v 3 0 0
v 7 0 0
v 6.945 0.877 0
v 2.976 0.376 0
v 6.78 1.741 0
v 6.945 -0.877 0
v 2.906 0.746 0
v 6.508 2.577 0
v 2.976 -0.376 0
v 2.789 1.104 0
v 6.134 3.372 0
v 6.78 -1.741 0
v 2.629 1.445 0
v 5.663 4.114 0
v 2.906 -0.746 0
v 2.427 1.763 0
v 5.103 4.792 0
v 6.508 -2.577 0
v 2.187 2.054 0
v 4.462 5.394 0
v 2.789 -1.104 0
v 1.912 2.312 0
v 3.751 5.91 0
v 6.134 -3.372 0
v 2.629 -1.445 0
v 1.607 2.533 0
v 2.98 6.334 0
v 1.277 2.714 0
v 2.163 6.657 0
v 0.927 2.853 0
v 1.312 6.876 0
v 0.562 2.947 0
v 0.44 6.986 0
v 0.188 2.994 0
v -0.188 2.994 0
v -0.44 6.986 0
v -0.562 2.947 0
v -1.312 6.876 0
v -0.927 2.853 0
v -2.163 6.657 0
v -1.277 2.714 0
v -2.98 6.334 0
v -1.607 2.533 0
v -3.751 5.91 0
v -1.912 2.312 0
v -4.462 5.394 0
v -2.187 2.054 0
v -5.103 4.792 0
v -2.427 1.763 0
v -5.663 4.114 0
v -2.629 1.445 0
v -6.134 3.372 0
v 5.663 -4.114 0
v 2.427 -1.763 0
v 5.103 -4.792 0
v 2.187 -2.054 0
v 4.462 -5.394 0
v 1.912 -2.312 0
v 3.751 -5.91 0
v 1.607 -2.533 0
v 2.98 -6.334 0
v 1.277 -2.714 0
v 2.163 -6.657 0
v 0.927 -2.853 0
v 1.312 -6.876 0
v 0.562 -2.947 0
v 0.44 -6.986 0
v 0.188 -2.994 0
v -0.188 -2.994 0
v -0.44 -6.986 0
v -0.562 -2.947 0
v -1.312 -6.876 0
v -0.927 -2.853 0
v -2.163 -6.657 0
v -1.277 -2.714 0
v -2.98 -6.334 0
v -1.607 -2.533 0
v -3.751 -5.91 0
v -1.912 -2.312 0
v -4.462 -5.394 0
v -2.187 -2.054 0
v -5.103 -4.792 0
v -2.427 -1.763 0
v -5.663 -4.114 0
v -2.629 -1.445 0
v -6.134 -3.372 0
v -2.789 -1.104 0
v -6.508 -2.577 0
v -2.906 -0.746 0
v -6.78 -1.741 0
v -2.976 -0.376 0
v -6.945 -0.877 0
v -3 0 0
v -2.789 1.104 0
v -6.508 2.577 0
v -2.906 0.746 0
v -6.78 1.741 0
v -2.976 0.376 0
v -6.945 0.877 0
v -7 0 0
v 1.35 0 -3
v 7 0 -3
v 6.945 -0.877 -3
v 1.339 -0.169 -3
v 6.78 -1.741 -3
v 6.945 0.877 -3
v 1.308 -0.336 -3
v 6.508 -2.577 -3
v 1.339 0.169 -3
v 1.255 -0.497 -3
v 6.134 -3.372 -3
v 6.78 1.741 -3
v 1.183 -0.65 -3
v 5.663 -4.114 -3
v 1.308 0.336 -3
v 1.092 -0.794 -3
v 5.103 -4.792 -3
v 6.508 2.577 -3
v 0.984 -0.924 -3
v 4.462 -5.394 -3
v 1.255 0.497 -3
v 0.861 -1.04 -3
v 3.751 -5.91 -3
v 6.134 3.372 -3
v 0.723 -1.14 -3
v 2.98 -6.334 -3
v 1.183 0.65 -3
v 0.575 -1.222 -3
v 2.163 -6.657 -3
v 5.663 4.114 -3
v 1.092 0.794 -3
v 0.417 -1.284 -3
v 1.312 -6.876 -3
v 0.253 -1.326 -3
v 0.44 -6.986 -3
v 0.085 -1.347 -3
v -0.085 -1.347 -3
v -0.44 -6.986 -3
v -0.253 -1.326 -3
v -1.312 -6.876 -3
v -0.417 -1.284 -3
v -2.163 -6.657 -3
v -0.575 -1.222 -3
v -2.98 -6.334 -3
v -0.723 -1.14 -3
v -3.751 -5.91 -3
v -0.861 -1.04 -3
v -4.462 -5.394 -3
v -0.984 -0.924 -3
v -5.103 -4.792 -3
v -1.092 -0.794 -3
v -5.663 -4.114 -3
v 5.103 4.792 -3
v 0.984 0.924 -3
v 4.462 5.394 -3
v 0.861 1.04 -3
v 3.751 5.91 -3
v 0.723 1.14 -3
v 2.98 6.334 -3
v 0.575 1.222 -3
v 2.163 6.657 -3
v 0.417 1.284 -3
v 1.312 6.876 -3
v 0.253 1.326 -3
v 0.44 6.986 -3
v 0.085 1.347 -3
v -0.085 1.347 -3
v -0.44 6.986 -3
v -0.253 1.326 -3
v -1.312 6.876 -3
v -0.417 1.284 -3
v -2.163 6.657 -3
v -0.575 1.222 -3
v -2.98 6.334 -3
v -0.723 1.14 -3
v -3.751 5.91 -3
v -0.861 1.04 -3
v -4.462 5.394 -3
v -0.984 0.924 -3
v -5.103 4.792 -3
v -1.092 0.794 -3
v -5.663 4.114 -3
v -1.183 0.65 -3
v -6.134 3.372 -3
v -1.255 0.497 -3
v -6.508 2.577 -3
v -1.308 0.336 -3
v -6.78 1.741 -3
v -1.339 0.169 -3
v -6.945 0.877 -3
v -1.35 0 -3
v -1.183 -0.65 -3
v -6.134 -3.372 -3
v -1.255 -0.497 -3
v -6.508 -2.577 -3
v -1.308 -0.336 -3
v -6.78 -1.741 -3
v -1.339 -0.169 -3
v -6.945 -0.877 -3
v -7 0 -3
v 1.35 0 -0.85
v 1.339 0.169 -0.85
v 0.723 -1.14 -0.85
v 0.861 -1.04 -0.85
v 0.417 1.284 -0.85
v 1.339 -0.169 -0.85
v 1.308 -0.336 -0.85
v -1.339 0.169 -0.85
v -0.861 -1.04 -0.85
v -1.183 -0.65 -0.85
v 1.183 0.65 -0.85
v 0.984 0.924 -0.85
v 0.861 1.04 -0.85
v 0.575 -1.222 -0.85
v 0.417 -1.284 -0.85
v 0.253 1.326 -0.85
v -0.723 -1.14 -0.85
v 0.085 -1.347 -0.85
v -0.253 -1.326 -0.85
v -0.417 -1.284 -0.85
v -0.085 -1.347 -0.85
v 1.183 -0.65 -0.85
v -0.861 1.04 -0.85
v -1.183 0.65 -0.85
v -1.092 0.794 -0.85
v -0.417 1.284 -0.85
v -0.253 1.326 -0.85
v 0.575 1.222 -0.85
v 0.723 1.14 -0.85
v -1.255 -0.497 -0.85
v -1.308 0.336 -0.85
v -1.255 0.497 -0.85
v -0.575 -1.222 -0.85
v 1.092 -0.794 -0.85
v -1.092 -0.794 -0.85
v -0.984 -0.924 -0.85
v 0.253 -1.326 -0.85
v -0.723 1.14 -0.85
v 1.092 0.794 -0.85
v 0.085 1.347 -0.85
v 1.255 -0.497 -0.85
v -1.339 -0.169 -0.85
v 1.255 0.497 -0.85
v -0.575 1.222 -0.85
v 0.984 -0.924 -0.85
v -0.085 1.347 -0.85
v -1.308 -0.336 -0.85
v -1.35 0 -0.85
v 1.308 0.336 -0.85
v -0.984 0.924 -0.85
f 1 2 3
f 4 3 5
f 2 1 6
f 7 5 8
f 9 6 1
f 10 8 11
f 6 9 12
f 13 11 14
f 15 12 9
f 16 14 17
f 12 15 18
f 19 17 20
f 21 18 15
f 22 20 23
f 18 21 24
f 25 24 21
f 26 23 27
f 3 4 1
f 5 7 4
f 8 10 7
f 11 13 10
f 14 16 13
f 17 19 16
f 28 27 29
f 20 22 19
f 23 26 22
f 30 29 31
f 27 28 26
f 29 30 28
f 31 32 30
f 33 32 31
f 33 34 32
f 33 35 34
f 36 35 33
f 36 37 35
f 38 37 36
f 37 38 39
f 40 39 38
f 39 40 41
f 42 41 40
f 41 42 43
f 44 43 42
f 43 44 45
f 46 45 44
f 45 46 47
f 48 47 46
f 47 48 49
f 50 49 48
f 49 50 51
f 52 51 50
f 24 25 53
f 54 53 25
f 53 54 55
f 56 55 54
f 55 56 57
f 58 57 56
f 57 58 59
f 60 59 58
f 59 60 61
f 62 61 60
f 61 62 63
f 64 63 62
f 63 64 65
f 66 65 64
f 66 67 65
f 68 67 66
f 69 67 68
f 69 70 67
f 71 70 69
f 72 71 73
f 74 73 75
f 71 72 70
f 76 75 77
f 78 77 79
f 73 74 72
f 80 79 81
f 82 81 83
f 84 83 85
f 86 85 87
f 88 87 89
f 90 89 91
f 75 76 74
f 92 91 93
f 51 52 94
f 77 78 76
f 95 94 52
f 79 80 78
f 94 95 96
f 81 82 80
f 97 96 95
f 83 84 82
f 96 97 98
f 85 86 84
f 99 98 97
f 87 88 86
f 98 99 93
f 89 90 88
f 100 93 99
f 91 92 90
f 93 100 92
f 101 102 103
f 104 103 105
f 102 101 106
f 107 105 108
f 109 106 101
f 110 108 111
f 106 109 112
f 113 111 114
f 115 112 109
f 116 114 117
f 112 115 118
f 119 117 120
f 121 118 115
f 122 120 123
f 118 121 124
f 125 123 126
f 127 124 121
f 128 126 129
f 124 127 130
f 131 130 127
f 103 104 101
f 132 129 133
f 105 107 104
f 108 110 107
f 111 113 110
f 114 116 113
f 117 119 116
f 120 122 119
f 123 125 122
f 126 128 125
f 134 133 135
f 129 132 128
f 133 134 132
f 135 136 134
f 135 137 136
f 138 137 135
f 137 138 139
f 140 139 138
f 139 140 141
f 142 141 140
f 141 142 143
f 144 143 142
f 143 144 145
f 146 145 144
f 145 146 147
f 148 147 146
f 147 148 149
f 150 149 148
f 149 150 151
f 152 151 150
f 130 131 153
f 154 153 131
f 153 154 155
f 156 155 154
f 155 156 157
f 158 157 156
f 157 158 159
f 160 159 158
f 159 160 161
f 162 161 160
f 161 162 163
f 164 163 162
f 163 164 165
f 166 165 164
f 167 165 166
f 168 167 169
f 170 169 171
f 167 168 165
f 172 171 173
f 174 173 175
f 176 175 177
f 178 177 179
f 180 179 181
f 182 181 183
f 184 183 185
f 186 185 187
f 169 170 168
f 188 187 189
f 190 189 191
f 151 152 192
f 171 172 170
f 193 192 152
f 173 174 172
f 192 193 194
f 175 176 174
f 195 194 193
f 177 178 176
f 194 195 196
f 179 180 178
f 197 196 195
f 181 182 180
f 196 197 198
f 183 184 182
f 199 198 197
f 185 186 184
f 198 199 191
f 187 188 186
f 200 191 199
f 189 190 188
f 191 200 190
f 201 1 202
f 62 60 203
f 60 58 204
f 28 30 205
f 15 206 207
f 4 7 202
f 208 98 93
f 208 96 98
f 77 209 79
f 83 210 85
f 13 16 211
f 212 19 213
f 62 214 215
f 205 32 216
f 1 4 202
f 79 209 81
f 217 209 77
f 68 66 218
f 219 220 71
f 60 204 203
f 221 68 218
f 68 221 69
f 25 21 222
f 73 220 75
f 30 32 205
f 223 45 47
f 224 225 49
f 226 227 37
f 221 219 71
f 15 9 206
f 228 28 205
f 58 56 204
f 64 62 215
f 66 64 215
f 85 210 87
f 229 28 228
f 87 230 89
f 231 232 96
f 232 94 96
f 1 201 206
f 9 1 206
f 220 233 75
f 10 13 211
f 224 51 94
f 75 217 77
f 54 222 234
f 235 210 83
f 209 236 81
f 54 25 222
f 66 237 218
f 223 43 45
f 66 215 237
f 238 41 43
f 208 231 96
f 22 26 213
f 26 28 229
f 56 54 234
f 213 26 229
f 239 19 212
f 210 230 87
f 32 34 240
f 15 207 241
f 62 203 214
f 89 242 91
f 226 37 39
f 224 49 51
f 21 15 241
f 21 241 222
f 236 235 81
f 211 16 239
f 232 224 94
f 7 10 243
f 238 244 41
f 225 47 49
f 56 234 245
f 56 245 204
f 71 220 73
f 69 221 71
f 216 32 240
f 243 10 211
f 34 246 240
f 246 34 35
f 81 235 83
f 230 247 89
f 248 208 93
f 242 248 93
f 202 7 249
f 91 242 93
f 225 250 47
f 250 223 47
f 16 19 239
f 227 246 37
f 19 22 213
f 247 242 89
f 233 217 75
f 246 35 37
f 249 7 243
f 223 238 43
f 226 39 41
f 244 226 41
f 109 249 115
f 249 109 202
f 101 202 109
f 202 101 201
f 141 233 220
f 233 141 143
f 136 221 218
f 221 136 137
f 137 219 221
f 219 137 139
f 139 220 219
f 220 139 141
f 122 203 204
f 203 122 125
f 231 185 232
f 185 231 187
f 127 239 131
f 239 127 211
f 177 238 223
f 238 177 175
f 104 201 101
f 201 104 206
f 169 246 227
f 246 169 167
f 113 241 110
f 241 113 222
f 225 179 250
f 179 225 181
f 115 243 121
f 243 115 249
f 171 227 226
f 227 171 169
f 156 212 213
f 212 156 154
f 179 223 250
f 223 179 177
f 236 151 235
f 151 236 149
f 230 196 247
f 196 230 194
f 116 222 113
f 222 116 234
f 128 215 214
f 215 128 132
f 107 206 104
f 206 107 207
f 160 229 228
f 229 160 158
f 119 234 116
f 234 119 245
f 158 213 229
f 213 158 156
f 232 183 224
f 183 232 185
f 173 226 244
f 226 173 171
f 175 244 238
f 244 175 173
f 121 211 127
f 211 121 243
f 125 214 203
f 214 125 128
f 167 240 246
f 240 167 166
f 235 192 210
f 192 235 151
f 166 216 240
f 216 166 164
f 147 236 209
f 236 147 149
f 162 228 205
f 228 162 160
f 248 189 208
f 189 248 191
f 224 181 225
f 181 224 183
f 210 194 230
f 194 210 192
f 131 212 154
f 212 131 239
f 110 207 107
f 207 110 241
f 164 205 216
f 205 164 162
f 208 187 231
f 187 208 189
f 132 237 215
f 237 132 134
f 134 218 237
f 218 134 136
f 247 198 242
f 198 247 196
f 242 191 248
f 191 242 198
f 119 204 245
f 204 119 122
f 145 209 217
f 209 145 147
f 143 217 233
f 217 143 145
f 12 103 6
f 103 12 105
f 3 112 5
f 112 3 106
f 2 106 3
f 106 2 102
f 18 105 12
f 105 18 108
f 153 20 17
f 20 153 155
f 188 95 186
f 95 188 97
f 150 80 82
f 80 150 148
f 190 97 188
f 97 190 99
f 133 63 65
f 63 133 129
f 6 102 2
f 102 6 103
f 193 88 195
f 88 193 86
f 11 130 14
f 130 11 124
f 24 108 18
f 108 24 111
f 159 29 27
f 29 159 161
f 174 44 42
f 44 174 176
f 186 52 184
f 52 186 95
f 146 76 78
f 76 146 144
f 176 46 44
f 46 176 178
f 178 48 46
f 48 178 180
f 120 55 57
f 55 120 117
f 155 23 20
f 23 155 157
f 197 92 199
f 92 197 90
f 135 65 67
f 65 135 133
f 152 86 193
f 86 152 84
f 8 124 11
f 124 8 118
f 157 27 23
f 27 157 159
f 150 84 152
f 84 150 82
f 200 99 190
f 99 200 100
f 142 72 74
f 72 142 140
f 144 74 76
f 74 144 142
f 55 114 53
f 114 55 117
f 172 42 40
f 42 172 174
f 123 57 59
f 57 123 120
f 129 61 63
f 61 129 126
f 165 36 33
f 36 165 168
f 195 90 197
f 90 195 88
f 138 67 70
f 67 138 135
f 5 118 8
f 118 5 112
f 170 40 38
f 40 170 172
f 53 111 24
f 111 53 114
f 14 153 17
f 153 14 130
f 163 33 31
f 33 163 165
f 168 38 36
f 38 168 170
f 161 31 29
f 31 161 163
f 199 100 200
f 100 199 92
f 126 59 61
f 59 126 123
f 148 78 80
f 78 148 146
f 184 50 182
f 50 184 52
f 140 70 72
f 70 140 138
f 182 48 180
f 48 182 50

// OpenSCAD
$fn = 50;


difference() {
	union() {
		translate(v = [0, 0, -3.0000000000]) {
			cylinder(h = 3, r = 7.0000000000);
		}
	}
	union() {
		translate(v = [0, 0, 0]) {
			rotate(a = [0, 0, 0]) {
				difference() {
					union() {
						translate(v = [0, 0, -3.0000000000]) {
							cylinder(h = 3, r = 1.0000000000);
						}
						translate(v = [0, 0, -0.8500000000]) {
							cylinder(h = 0.8500000000, r1 = 1.3500000000, r2 = 3.0000000000);
						}
						translate(v = [0, 0, -3.0000000000]) {
							cylinder(h = 3, r = 1.3500000000);
						}
						translate(v = [0, 0, -3.0000000000]) {
							cylinder(h = 3, r = 1.0000000000);
						}
					}
					union();
				}
			}
		}
	}
}
